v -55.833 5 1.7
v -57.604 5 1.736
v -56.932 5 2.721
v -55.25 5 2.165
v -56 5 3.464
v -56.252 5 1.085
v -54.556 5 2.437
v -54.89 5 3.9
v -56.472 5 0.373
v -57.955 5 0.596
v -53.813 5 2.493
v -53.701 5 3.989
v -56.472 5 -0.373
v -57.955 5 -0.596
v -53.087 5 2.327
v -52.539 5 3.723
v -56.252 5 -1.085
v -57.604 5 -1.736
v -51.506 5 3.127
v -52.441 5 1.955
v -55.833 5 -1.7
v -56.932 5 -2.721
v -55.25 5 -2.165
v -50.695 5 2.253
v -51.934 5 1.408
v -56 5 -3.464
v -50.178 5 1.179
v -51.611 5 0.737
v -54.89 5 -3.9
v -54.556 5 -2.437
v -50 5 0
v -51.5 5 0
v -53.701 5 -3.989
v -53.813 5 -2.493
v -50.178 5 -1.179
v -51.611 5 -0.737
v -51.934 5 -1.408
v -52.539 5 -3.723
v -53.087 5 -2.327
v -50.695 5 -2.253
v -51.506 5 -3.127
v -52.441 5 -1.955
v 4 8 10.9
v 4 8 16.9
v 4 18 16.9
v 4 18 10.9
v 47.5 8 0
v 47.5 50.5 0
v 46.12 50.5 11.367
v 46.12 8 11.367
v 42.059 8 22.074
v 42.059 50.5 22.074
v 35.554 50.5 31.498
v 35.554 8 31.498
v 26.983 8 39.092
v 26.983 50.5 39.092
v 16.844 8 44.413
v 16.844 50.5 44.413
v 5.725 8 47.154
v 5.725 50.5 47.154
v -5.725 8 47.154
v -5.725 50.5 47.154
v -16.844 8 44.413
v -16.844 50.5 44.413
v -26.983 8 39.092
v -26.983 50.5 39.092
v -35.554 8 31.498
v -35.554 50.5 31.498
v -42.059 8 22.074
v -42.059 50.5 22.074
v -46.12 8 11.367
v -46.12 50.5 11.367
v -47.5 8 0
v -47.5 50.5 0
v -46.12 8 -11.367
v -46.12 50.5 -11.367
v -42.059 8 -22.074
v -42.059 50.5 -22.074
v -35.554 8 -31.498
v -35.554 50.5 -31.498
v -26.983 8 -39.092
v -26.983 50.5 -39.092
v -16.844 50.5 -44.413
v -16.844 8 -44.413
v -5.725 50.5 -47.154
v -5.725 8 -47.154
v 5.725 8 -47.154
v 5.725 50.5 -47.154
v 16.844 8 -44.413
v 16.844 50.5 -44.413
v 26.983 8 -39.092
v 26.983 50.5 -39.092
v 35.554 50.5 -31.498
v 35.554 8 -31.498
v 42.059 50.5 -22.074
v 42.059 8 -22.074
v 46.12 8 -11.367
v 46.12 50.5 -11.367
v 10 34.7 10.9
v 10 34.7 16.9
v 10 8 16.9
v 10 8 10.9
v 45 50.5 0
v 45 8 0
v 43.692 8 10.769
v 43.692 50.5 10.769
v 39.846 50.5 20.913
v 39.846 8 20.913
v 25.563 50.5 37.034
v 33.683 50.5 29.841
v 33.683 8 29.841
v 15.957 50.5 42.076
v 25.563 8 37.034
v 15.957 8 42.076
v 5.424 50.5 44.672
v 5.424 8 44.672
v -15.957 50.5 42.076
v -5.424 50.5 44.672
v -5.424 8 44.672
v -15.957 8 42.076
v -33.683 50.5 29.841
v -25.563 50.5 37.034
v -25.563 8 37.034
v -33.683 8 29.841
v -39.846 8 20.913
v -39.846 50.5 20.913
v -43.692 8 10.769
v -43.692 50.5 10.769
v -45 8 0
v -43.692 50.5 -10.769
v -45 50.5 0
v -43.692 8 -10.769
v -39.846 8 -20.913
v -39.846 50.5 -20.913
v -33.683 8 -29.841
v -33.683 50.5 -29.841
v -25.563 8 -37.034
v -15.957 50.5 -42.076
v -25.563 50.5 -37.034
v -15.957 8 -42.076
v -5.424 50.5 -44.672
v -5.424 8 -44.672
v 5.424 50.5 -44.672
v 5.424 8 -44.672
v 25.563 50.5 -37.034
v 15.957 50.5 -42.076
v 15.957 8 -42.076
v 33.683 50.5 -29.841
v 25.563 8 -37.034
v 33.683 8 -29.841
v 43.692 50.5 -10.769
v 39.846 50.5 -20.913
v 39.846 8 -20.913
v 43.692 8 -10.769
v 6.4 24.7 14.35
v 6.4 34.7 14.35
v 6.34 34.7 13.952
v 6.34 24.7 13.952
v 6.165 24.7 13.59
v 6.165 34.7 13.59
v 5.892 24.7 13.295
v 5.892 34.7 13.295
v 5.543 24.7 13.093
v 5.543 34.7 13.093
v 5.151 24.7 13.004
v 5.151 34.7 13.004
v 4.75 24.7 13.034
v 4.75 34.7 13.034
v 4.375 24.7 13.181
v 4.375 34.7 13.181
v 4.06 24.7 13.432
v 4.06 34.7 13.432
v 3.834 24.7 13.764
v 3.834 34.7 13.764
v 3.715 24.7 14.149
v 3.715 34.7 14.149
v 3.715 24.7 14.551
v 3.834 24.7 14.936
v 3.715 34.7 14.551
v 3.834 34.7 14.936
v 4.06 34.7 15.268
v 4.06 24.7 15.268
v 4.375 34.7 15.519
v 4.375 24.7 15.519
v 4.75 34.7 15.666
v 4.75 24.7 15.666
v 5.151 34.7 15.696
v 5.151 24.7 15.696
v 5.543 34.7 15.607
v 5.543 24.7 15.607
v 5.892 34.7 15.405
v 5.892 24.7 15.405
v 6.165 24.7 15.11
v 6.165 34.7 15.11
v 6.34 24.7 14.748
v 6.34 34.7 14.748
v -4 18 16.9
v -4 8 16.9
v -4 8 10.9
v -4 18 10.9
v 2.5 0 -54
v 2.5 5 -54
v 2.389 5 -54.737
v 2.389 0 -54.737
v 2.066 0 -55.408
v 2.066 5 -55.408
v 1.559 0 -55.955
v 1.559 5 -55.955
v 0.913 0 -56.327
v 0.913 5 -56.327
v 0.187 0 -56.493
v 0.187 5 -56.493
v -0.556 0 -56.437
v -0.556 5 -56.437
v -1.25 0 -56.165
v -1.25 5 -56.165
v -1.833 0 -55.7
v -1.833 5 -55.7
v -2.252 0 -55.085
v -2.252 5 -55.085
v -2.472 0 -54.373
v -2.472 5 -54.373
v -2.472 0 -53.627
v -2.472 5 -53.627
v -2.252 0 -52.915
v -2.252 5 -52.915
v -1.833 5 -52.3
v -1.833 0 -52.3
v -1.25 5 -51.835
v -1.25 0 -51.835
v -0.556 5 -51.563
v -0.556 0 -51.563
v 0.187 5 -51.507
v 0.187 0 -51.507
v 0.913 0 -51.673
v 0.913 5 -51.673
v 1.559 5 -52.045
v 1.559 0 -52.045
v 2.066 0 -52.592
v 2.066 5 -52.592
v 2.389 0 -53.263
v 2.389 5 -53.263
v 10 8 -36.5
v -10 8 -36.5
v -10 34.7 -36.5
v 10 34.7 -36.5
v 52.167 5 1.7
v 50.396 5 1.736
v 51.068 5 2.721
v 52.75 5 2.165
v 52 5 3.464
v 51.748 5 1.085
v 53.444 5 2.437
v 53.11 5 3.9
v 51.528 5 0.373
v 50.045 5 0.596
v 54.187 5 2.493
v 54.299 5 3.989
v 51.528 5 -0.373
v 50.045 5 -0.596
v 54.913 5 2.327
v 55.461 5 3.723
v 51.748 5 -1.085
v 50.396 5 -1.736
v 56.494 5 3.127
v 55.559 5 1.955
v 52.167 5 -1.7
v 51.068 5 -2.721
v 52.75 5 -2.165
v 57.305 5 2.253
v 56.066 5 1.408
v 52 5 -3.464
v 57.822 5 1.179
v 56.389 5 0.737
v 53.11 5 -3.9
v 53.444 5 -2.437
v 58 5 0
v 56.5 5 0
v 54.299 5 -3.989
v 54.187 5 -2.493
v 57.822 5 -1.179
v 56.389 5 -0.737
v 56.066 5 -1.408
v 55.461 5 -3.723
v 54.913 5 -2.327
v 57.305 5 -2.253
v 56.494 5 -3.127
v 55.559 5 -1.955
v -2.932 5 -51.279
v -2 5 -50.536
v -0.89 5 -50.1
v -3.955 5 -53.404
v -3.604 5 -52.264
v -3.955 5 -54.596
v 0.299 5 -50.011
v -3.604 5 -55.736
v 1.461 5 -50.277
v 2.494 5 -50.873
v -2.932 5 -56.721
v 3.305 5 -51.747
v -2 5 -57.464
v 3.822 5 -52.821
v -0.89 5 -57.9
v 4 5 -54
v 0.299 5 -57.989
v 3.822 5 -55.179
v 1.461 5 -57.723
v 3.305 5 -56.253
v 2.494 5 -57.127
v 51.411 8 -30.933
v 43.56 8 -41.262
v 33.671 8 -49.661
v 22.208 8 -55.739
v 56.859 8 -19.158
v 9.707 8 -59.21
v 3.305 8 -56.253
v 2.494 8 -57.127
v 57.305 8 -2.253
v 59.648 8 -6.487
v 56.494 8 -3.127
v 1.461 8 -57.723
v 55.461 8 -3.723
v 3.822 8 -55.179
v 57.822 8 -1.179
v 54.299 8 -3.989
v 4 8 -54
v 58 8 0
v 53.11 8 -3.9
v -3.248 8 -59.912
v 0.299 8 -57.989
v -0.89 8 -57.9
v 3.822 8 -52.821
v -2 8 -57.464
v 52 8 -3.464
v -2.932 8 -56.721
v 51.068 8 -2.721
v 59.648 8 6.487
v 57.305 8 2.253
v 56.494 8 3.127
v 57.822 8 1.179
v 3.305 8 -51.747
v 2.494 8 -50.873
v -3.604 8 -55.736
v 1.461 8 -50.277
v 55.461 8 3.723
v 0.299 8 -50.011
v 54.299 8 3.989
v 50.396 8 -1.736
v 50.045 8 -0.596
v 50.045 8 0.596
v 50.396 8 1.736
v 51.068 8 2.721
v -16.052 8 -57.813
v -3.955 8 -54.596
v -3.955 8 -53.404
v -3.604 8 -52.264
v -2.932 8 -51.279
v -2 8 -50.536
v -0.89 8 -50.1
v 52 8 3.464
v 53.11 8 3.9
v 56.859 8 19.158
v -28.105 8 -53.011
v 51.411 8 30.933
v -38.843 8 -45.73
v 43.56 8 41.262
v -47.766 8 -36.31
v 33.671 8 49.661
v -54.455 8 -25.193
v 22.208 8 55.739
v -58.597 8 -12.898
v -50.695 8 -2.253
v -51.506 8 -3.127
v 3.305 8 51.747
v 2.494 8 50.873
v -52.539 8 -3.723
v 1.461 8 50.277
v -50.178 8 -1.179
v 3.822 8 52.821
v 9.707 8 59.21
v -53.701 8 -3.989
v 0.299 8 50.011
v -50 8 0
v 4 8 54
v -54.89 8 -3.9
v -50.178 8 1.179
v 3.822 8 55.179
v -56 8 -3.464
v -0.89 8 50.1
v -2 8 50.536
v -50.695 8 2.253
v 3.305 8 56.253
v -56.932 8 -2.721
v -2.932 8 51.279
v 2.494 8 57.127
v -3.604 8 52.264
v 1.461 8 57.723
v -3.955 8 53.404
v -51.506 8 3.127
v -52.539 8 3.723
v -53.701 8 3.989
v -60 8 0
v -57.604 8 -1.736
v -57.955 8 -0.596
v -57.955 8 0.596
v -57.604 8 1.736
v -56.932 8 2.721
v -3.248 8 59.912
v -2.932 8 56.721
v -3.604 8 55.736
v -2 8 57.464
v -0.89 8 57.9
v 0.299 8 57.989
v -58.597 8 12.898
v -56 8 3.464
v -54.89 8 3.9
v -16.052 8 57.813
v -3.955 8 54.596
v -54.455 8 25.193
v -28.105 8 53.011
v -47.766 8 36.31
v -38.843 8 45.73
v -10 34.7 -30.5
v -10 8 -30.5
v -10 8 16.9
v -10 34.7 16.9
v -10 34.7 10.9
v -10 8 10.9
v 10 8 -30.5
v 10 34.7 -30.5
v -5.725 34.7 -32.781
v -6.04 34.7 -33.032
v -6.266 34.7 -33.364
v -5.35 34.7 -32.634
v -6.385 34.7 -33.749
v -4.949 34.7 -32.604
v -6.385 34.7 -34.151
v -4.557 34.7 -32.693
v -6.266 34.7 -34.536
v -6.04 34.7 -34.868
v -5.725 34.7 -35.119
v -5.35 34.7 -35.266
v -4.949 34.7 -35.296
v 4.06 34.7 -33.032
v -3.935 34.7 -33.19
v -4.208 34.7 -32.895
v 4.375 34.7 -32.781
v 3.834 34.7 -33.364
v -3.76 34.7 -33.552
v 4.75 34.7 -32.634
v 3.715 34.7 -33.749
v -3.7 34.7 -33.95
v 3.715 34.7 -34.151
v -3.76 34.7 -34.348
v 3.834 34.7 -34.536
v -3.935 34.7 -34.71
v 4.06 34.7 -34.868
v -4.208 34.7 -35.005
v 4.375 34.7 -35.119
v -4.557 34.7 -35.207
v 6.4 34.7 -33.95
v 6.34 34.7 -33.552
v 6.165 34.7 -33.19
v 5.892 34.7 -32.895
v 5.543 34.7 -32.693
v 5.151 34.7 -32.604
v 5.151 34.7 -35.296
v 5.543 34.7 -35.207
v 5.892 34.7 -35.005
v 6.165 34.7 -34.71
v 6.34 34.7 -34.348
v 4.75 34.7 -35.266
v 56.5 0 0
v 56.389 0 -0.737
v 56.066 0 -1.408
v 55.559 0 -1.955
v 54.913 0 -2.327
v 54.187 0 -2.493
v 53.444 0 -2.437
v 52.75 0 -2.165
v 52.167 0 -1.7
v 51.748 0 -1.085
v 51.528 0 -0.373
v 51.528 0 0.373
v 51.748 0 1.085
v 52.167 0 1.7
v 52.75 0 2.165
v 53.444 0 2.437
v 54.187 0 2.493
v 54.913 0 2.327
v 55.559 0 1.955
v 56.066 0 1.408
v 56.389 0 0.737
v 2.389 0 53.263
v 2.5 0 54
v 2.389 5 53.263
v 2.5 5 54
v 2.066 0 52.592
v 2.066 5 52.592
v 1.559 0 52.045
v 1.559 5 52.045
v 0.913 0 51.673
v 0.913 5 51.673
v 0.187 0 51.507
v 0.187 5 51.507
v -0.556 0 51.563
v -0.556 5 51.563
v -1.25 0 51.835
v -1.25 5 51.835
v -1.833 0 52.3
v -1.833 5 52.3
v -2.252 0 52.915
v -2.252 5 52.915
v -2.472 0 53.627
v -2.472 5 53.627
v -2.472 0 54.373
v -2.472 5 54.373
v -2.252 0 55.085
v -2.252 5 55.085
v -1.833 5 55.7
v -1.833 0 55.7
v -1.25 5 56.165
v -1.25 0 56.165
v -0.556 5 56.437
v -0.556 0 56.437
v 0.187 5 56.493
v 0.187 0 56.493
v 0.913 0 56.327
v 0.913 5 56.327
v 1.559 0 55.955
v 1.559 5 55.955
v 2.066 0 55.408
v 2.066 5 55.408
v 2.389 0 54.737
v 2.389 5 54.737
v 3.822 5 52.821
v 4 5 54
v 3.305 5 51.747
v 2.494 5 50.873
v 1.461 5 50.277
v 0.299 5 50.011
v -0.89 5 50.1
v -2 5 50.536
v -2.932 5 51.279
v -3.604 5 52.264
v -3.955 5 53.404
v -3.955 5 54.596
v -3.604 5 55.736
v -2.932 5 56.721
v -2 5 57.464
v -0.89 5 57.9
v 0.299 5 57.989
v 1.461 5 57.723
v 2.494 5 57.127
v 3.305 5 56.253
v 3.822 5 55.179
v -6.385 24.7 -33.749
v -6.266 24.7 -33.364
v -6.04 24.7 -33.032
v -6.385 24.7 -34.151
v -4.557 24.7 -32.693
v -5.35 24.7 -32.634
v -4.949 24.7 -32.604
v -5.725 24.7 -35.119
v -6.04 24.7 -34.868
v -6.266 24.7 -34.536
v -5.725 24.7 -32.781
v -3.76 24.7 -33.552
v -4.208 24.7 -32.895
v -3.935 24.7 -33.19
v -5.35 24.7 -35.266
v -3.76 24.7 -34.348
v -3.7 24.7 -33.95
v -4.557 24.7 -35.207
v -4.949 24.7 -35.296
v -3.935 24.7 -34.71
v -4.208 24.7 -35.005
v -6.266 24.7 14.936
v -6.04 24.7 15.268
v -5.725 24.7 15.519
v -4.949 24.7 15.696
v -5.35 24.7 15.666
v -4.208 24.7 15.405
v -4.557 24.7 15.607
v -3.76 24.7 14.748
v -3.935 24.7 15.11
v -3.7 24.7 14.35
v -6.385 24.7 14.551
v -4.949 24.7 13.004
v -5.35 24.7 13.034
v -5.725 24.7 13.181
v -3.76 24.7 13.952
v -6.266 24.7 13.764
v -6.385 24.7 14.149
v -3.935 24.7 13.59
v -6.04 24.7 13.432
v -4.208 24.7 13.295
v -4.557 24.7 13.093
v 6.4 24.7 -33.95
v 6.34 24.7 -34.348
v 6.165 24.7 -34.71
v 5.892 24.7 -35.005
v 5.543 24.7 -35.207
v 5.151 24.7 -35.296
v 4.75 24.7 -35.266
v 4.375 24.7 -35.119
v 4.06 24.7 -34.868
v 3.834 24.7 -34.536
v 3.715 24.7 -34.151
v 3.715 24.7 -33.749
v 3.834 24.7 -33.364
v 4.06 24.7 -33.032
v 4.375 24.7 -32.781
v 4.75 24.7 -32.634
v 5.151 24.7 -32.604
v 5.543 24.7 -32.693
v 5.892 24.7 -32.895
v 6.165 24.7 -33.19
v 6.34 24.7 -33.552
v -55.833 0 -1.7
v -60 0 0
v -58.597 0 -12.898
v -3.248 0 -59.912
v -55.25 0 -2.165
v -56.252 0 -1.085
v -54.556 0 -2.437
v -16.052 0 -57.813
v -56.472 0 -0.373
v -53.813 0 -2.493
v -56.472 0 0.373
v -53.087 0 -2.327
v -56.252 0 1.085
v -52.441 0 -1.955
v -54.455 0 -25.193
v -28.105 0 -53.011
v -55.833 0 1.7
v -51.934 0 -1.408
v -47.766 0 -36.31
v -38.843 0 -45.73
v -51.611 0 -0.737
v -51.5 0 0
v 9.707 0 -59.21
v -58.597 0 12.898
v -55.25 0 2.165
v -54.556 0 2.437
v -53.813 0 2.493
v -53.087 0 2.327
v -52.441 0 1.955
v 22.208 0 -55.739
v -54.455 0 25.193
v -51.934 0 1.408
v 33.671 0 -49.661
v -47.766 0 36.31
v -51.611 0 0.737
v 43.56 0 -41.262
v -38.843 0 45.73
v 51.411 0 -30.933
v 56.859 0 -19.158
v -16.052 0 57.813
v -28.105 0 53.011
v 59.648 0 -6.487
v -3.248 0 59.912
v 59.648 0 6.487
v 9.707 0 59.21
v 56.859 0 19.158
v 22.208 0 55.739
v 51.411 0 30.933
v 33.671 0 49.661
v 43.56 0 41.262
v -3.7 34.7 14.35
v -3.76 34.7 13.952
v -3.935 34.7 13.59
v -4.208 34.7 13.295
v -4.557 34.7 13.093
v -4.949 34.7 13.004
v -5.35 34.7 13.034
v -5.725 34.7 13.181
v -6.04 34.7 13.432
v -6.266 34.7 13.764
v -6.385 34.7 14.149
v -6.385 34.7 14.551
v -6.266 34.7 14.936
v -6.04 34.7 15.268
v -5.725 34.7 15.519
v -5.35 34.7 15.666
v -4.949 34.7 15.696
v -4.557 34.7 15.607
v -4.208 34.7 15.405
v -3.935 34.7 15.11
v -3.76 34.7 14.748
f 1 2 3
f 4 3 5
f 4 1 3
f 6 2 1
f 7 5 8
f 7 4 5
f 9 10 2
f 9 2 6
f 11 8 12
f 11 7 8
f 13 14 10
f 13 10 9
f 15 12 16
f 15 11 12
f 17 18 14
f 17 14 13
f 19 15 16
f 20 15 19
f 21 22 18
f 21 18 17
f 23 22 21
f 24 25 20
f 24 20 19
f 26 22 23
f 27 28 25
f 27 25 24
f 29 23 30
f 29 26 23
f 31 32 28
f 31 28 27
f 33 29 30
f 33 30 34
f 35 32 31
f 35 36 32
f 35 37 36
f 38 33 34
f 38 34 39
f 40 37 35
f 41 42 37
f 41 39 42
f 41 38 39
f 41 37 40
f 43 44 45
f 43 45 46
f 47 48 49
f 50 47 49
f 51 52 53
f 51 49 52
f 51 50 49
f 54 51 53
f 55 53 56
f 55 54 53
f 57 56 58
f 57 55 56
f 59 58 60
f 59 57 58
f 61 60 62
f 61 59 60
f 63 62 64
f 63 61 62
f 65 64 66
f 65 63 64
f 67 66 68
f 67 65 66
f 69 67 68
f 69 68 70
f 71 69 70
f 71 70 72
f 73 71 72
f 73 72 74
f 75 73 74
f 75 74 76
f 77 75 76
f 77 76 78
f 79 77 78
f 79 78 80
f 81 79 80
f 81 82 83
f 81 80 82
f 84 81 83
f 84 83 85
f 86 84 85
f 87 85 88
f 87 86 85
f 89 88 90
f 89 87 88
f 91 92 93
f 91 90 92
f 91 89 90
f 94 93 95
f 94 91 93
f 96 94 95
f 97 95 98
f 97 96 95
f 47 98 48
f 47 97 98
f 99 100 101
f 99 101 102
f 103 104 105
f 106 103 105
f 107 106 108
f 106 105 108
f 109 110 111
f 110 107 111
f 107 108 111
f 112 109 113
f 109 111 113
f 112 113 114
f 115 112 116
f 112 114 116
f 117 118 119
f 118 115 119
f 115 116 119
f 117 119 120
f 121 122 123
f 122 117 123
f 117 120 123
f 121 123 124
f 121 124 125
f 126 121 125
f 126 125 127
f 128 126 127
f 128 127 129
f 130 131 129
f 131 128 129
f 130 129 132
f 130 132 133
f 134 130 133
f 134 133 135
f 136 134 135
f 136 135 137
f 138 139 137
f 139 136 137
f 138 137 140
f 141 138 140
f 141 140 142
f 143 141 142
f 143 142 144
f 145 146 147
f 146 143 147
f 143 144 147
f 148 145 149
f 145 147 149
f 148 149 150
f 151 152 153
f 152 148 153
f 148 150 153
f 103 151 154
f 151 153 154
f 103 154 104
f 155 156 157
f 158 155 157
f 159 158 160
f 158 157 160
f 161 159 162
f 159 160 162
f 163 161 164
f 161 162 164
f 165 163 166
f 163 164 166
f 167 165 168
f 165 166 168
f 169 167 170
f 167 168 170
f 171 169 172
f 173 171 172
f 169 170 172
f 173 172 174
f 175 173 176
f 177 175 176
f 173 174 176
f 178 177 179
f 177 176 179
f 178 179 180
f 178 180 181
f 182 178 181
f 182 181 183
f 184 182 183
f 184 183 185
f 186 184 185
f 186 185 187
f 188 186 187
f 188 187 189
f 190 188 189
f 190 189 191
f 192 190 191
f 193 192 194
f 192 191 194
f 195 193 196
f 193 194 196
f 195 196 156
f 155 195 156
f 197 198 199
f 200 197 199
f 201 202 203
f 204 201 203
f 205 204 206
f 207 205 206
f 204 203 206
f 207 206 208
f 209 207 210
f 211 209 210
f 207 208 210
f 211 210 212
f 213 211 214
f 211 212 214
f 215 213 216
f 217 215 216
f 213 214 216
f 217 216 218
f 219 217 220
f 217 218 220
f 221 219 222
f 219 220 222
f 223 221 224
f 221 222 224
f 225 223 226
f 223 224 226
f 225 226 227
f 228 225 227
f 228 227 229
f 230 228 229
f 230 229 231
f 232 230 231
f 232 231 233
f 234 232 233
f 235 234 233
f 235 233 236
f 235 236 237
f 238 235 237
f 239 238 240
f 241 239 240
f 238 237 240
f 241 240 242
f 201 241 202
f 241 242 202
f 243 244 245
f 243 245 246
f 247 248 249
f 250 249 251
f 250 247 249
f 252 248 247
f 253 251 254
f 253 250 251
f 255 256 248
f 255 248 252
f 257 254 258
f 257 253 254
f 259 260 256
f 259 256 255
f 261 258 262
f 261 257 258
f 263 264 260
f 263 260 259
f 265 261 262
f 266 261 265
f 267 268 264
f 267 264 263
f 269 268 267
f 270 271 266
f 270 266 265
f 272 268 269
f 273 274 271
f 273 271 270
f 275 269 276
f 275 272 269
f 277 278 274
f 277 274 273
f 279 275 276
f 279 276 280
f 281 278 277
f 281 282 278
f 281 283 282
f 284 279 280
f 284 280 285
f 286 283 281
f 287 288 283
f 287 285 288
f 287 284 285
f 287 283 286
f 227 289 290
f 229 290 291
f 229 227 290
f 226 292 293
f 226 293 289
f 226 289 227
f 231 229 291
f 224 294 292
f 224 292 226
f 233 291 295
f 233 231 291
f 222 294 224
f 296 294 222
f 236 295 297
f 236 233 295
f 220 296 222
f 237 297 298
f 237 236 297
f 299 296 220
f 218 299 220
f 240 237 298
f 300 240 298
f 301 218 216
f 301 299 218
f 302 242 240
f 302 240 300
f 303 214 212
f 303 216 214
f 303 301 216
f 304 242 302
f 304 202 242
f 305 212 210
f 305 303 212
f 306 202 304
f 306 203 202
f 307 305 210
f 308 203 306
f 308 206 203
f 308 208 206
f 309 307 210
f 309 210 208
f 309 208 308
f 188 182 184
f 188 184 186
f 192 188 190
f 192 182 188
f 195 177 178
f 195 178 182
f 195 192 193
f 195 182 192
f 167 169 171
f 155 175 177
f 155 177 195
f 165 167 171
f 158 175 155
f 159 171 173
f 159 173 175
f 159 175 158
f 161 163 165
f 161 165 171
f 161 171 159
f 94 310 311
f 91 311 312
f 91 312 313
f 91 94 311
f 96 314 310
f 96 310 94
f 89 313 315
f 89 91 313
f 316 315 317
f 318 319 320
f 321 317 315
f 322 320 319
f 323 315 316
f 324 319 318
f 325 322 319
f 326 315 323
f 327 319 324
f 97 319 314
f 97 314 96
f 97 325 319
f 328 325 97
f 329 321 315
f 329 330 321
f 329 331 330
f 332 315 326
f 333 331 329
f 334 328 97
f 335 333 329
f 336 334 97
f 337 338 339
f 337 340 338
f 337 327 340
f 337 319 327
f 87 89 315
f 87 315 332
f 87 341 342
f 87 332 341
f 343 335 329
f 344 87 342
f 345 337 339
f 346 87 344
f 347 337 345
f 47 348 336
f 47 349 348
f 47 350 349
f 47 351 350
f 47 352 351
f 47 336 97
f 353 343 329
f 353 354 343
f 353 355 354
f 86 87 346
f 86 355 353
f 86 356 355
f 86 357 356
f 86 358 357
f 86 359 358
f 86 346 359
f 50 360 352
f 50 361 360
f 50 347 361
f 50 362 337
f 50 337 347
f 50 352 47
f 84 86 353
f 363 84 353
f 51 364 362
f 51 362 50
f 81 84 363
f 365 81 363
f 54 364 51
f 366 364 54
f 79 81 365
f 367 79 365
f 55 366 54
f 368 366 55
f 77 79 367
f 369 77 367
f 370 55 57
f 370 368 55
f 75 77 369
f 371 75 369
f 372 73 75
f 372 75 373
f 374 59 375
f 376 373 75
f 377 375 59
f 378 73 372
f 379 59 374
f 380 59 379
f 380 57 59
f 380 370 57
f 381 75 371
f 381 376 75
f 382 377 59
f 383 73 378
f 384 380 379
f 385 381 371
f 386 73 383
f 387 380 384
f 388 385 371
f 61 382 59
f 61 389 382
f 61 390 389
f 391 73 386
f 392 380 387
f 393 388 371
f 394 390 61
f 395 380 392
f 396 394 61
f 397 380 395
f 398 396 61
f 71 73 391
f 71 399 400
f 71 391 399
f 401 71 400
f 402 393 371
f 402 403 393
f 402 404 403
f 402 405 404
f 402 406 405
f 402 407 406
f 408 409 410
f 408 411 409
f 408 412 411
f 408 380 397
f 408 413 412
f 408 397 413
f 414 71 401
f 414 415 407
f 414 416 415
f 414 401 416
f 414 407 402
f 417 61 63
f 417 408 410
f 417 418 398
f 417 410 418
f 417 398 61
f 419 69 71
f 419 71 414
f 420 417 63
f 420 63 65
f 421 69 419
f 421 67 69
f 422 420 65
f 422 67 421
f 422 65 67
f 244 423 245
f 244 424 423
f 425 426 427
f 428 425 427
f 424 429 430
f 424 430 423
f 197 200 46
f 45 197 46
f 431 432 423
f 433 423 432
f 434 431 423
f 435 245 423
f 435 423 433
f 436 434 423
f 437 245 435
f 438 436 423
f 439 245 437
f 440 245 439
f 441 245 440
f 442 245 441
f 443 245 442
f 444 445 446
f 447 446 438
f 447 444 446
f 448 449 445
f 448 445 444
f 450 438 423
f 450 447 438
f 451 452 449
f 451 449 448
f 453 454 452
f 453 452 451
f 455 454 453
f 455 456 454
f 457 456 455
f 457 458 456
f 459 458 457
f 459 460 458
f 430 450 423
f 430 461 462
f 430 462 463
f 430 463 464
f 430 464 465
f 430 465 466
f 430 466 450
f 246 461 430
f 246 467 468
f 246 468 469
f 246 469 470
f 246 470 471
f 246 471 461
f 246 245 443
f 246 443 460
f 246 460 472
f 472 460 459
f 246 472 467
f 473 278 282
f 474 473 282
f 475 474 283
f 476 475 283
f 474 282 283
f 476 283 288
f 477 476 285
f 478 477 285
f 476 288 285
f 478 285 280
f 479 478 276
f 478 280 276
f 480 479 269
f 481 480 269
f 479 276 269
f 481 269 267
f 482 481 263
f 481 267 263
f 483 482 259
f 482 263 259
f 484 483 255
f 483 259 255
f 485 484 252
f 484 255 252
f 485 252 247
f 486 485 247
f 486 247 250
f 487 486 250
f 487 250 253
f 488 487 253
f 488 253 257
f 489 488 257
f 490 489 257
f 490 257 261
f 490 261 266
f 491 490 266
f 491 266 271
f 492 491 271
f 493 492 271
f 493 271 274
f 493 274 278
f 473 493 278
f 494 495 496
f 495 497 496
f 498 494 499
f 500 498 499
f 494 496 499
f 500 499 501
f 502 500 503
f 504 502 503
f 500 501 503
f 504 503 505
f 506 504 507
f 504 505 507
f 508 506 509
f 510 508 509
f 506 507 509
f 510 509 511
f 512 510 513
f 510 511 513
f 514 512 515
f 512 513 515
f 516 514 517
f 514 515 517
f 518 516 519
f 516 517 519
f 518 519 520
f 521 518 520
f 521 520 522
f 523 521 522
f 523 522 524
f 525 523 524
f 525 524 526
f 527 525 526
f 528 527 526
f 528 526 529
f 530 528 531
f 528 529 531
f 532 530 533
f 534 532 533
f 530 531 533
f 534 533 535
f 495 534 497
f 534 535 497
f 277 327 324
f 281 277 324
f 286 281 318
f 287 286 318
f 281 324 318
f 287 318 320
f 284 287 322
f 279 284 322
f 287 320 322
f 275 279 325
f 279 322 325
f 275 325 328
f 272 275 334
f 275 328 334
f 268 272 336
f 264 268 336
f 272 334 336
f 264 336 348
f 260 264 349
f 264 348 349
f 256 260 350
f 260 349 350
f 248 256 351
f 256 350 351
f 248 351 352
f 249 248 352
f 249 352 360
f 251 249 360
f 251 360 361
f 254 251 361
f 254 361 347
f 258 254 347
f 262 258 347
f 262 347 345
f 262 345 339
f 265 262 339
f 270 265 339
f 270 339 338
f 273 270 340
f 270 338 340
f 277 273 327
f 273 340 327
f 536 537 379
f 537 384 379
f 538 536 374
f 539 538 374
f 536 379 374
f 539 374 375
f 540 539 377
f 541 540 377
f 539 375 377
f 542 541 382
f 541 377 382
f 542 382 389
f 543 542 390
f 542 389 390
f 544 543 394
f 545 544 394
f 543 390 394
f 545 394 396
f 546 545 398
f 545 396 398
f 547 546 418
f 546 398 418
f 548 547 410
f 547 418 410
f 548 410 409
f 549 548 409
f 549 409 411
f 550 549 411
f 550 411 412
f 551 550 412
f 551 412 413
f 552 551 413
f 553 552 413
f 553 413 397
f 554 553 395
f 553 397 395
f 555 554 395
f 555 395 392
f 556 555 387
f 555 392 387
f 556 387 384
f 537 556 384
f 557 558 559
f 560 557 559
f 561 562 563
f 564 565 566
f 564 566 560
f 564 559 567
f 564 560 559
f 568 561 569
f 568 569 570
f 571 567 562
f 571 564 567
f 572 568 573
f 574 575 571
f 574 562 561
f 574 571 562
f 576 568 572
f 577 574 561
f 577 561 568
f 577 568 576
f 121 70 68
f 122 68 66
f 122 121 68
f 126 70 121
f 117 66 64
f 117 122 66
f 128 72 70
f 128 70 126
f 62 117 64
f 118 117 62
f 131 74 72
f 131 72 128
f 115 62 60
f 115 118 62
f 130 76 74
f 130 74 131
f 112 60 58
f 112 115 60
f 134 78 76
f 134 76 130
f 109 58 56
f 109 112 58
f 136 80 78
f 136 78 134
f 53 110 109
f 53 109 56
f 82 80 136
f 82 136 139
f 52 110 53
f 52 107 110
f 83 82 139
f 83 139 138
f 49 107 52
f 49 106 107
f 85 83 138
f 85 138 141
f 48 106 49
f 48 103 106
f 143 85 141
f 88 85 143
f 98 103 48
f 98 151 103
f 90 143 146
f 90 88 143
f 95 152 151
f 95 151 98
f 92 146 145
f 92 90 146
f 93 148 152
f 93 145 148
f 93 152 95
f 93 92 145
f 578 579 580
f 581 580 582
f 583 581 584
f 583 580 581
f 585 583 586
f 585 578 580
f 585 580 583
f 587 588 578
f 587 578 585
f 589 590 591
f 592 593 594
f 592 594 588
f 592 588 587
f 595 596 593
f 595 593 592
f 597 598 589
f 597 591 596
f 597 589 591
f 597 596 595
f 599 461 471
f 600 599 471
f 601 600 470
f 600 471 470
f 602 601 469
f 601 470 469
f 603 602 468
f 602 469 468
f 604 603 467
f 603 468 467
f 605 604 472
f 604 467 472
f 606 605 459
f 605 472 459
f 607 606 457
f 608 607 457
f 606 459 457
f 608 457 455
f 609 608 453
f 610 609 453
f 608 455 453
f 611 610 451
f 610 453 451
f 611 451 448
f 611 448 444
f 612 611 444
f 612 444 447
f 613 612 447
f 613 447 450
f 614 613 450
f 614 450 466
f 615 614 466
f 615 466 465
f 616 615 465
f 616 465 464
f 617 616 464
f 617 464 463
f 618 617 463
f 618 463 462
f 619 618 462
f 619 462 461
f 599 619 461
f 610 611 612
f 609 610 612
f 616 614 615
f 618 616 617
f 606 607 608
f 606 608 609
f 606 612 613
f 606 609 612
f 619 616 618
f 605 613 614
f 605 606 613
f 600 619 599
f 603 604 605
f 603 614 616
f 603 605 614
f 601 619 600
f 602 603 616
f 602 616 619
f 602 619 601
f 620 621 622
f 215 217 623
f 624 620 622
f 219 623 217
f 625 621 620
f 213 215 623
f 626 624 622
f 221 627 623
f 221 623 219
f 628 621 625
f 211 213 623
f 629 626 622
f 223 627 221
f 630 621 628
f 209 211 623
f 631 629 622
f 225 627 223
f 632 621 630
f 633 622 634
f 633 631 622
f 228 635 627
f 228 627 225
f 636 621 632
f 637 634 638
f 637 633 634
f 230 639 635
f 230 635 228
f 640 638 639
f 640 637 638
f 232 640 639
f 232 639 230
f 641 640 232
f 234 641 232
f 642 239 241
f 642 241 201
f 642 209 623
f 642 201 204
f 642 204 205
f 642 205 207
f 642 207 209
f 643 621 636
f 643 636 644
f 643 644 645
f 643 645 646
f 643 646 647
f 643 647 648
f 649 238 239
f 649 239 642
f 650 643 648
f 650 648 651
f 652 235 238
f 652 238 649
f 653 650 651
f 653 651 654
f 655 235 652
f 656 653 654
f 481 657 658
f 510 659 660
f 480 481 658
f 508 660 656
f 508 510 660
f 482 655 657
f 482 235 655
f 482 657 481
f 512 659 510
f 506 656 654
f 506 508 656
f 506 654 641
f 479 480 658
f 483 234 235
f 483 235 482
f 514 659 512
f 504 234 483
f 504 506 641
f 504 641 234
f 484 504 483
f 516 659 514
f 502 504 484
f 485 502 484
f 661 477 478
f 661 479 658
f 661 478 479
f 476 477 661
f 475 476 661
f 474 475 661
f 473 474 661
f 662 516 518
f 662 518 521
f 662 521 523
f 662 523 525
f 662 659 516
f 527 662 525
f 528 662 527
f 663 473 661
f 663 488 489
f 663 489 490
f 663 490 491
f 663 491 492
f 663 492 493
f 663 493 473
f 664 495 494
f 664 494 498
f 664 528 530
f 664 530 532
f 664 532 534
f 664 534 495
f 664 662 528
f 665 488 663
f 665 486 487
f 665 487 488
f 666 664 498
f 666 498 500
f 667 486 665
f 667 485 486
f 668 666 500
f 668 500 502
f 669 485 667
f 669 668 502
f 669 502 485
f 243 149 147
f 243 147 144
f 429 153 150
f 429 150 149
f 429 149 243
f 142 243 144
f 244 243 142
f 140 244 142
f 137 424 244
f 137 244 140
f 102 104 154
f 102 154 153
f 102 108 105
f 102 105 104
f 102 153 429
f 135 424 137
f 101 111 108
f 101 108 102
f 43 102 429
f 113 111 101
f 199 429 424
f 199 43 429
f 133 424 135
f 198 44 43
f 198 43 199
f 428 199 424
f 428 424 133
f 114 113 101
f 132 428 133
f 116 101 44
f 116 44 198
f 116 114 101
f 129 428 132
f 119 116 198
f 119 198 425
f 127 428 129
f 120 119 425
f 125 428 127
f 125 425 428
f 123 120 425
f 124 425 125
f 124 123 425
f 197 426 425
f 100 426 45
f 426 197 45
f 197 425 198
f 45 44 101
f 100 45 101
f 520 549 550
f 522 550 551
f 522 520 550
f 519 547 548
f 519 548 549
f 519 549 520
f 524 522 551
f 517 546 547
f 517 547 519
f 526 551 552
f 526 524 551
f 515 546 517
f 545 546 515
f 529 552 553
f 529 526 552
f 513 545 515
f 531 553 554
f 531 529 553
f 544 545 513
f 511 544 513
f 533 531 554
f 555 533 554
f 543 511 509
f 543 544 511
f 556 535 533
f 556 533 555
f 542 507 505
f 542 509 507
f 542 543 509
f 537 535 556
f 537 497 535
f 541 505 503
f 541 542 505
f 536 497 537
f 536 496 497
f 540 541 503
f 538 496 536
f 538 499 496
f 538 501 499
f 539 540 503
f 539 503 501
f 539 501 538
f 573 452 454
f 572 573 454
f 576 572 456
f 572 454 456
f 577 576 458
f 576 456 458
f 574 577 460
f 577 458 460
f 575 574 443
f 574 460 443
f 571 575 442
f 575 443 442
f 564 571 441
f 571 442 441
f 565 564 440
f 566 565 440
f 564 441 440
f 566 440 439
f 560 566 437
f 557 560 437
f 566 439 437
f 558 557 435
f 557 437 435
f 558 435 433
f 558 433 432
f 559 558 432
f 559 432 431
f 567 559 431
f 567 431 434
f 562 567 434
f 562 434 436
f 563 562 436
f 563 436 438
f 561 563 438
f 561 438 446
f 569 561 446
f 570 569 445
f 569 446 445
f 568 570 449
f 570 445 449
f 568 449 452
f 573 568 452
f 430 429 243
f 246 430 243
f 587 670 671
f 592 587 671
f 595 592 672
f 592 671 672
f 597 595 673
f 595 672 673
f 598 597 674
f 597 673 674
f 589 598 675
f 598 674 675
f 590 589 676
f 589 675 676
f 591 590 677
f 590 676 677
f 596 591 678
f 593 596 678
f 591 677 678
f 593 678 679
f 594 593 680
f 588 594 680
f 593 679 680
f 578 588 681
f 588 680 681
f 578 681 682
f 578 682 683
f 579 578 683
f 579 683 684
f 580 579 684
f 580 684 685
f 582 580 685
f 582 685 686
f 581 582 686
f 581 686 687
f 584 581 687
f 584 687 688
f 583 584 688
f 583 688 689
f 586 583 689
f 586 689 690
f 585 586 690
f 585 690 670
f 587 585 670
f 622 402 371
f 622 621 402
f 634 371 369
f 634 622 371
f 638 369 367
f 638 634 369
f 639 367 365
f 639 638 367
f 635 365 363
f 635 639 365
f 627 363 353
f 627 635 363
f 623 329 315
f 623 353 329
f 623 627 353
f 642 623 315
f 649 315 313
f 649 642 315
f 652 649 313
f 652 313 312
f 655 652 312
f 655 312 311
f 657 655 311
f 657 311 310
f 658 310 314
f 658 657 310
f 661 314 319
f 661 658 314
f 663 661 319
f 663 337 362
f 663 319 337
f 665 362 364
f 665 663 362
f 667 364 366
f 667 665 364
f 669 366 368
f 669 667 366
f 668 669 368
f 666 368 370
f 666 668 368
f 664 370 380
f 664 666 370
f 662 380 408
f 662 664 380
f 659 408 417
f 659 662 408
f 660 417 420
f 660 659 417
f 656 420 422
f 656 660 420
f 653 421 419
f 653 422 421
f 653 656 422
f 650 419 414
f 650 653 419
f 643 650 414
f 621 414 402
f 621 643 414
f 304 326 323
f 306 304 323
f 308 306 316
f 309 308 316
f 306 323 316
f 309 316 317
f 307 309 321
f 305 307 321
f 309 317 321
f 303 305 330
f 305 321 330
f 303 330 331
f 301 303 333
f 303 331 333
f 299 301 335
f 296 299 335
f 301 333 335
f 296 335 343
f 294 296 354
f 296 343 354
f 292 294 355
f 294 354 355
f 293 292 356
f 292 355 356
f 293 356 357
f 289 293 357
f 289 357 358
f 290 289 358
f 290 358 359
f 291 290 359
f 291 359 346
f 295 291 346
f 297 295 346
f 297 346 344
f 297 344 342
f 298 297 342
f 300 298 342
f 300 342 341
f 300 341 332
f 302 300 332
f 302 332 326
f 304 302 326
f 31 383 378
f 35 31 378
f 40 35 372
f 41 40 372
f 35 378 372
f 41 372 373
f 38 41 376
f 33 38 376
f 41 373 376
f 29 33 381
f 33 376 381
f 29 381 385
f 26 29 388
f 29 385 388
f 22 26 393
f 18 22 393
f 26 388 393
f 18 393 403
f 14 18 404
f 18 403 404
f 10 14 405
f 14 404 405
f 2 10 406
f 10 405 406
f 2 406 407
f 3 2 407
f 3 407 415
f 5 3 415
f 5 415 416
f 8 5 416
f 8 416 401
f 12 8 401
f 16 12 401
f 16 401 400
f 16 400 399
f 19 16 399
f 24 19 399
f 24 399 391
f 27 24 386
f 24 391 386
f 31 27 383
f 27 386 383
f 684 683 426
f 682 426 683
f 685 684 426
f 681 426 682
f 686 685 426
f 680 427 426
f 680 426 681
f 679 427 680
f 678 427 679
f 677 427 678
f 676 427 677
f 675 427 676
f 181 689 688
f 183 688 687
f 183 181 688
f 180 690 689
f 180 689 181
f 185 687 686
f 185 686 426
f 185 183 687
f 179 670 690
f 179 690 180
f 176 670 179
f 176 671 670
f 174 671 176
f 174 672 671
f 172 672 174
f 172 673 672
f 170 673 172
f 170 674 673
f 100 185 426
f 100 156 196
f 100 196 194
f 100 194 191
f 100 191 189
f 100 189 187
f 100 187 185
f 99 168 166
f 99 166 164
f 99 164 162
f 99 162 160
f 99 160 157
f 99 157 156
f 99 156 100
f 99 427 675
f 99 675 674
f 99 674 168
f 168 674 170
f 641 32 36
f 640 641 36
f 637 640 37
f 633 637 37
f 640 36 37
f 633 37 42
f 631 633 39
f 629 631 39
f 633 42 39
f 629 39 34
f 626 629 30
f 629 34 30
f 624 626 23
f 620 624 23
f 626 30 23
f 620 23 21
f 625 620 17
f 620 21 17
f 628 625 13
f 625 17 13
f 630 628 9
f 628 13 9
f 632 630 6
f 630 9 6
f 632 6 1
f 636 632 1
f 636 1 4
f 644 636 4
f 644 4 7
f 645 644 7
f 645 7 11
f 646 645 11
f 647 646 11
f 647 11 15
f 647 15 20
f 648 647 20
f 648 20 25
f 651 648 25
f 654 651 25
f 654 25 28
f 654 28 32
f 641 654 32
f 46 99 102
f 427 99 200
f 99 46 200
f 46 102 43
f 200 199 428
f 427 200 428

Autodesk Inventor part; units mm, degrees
ref_plane "YZ Plane" through (0, 0, 0) normal (1, 0, 0) x (0, 1, 0)
ref_plane "XZ Plane" through (0, 0, 0) normal (0, 1, 0) x (-1, 0, 0)
ref_plane "XY Plane" through (0, 0, 0) normal (0, 0, 1) x (1, 0, 0)
sketch "Sketch1" plane through (0, 0, 0) normal (0, 1, 0) x (-1, 0, 0)
  circle A0 centre (0, 0) radius 60
  dimension "d0" = 120
extrude "Extrusion1" add sketch "Sketch1" along normal blind 8
sketch "Sketch2" plane through (0, 8, 0) normal (0, 1, 0) x (1, 0, 0)
  circle A0 centre (-54, 0) radius 4
  circle A1 centre (-54, 0) radius 2.5
  circle A2 centre (0, -54) radius 4
  circle A3 centre (0, -54) radius 2.5
  circle A4 centre (54, 0) radius 4
  circle A5 centre (54, 0) radius 2.5
  circle A6 centre (0, 54) radius 4
  circle A7 centre (0, 54) radius 2.5
  point P0 (0, 0)
  dimension "d3" = 8
  dimension "d4" = 5
  dimension "d5" = 8
  dimension "d6" = 5
  dimension "d7" = 8
  dimension "d8" = 5
  dimension "d9" = 8
  dimension "d10" = 5
extrude "Extrusion2" cut sketch "Sketch2" against normal blind 8 contours A1 | A3 | A5 | A7
sketch "Sketch3" plane through (0, 8, 0) normal (0, 1, 0) x (1, 0, 0)
  circle A0 centre (-54, 0) radius 2.5 projected
  circle A1 centre (-54, 0) radius 4
  circle A2 centre (-54, 0) radius 2.5
  circle A3 centre (0, 54) radius 2.5 projected
  circle A4 centre (0, 54) radius 4
  circle A5 centre (0, 54) radius 2.5
  circle A6 centre (54, 0) radius 2.5 projected
  circle A7 centre (54, 0) radius 4
  circle A8 centre (54, 0) radius 2.5
  circle A9 centre (0, -54) radius 4
  circle A10 centre (0, -54) radius 2.5
  point P0 (0, 0)
  dimension "d13" = 8
  dimension "d14" = 8
  dimension "d15" = 5
  dimension "d16" = 8
  dimension "d17" = 5
  dimension "d18" = 8
extrude "Extrusion3" cut sketch "Sketch3" against normal blind 3
sketch "Sketch4" plane through (0, 8, 0) normal (0, 1, 0) x (1, 0, 0)
  circle A0 centre (0, 0) radius 47.5
  circle A1 centre (0, 0) radius 45
  line L0 (0, 0) -> (-10, 0)
  line L1 (-10, 0) -> (-10, -9)
  line L2 (-10, -9) -> (0, -9)
  line L3 (0, -9) -> (0, 0)
  line L4 (0, -9) -> (10, -9)
  line L5 (10, -9) -> (10, 0)
  line L6 (10, 0) -> (0, 0)
  line L7 (0, 0) -> (0, -9)
  line L8 (-10, -9) -> (10, -9)
  line L9 (10, -9) -> (10, -16)
  line L10 (10, -16) -> (-10, -16)
  line L11 (-10, -16) -> (-10, -9)
  dimension "d21" = 95
  dimension "d22" = 90
  dimension "d23" = 10
  dimension "d24" = 9
  dimension "d25" = 10
  dimension "d26" = 7
extrude "Extrusion4" add sketch "Sketch4" along normal blind 10 contours A0
sketch "Sketch5" plane through (0, 8, 0) normal (0, 1, 0) x (1, 0, 0)
  line L0 (0, 0) -> (-10, 0)
  line L1 (-10, 0) -> (-10, -9)
  line L2 (-10, -9) -> (0, -9)
  line L3 (0, -9) -> (0, 0)
  line L4 (-10, -9) -> (10, -9)
  line L5 (10, -9) -> (10, -16)
  line L6 (10, -16) -> (-10, -16)
  line L7 (-10, -16) -> (-10, -9)
  line L8 (-10, -9) -> (10, -9)
  line L9 (10, -9) -> (10, 31)
  line L10 (10, 31) -> (-10, 31)
  line L11 (-10, 31) -> (-10, -9)
  line L12 (-10, 31) -> (-2, 31)
  line L13 (-2, 31) -> (-2, 38.36)
  line L14 (-2, 38.36) -> (-10, 38.36)
  line L15 (-10, 38.36) -> (-10, 31)
  line L16 (-10, 31) -> (10, 31)
  line L17 (10, 31) -> (10, 39)
  line L18 (10, 39) -> (-10, 39)
  line L19 (-10, 39) -> (-10, 31)
  line L20 (-10, -9) -> (10, -9)
  line L21 (10, -9) -> (10, -17)
  line L22 (10, -17) -> (-10, -17)
  line L23 (-10, -17) -> (-10, -9)
  dimension "d29" = 10
  dimension "d30" = 9
  dimension "d31" = 20
  dimension "d32" = 7
  dimension "d33" = 40
  dimension "d34" = 8
  dimension "d35" = 8
  dimension "d36" = 8
extrude "Extrusion5" add sketch "Sketch5" along normal blind 28 contours L4 L5 L6 L7 L2 | L15 L14 L13 L10 | L6 L21 L22 L23 | L13 L14 L19 L18 L17 L10
sketch "Sketch6" plane through (0, 36, 0) normal (0, 1, 0) x (1, 0, 0)
  line L0 (10, -17) -> (-10, -17) projected
  line L1 (-10, -9) -> (10, -9) projected
  line L2 (0, -17) -> (-4, -17)
  line L3 (-4, -17) -> (-4, -9)
  line L4 (-4, -9) -> (0, -9)
  line L5 (0, -9) -> (0, -17)
  line L6 (0, -17) -> (4, -17)
  line L7 (4, -17) -> (4, -9)
  line L8 (4, -9) -> (0, -9)
  line L9 (0, -9) -> (0, -17)
  point P0 (0, 0)
  dimension "d39" = 4
  dimension "d40" = 4
extrude "Extrusion6" cut sketch "Sketch6" against normal blind 28
sketch "Sketch7" plane through (0, 36, 0) normal (0, 1, 0) x (1, 0, 0)
  line L0 (-10, -17) -> (-4, -17) projected
  line L1 (4, -9) -> (10, -9) projected
  line L2 (-4, -17) -> (4, -17)
  line L3 (4, -17) -> (4, -9)
  line L4 (4, -9) -> (-4, -9)
  line L5 (-4, -9) -> (-4, -17)
  point P0 (0, 0)
extrude "Extrusion7" add sketch "Sketch7" against normal blind 22
sketch "Sketch8" plane through (0, 36, 0) normal (0, 1, 0) x (1, 0, 0)
  line L0 (-4, -17) -> (-10, -17) projected
  line L1 (10, -17) -> (10, -9) projected
  line L2 (-10, -17) -> (10, -17)
  line L3 (10, -17) -> (10, -15)
  line L4 (10, -15) -> (-10, -15)
  line L5 (-10, -15) -> (-10, -17)
  line L6 (-4, -9) -> (4, -9) projected
  line L7 (0, -9) -> (-5, -9)
  line L8 (-5, -9) -> (-5, -17)
  line L9 (-5, -17) -> (0, -17)
  line L10 (0, -17) -> (0, -9)
  line L11 (-10, -17) -> (10, -17) projected
  line L12 (0, -9) -> (5, -9)
  line L13 (5, -9) -> (5, -17)
  line L14 (5, -17) -> (0, -17)
  line L15 (0, -17) -> (0, -9)
  circle A0 centre (-5, -15) radius 2
  circle A1 centre (5, -15) radius 2
  line L16 (-10, 31) -> (-10, 39) projected
  line L17 (10, 39) -> (10, 31) projected
  line L18 (-10, 39) -> (10, 39)
  line L19 (10, 39) -> (10, 37)
  line L20 (10, 37) -> (-10, 37)
  line L21 (-10, 37) -> (-10, 39)
  line L22 (10, 31) -> (-10, 31) projected
  line L23 (-10, 39) -> (10, 39) projected
  line L24 (0, 31) -> (-5, 31)
  line L25 (-5, 31) -> (-5, 39)
  line L26 (-5, 39) -> (0, 39)
  line L27 (0, 39) -> (0, 31)
  line L28 (0, 31) -> (5, 31)
  line L29 (5, 31) -> (5, 39)
  line L30 (5, 39) -> (0, 39)
  line L31 (0, 39) -> (0, 31)
  circle A2 centre (-5, 37) radius 2
  circle A3 centre (5, 37) radius 2
  point P0 (0, 0)
  dimension "d45" = 2
  dimension "d46" = 5
  dimension "d47" = 5
  dimension "d48" = 4
  dimension "d49" = 4
  dimension "d50" = 2
  dimension "d51" = 4
  dimension "d52" = 4
extrude "Extrusion8" cut sketch "Sketch8" against normal blind 10 contours A0 L4 L8 | L8 L4 A0 | L8 A0 L4 | L4 A0 L8 | A1 L4 L13 | L13 L4 A1 | L13 A1 L4 | L4 A1 L13 | A2 L25 L20 | L20 L25 A2 | L25 L20 A2 | A2 L20 L25 | A3 L20 L29 | L29 L20 A3 | A3 L29 L20 | A3 L20 L29
sketch "Sketch9" plane through (0, 36, 0) normal (0, 1, 0) x (1, 0, 0)
  line L0 (-10, -17) -> (-5, -17) projected
  line L1 (10, -9) -> (-10, -9) projected
  line L2 (-10, -17) -> (10, -17)
  line L3 (10, -17) -> (10, -9)
  line L4 (10, -9) -> (-10, -9)
  line L5 (-10, -9) -> (-10, -17)
  line L6 (10, 31) -> (10, 39) projected
  line L7 (-10, 31) -> (10, 31)
  line L8 (10, 31) -> (10, 39)
  line L9 (10, 39) -> (-10, 39)
  line L10 (-10, 39) -> (-10, 31)
  point P0 (0, 0)
extrude "Extrusion9" cut sketch "Sketch9" against normal blind 28
sketch "Sketch10" plane through (0, 8, 0) normal (0, 1, 0) x (1, 0, 0)
  line L0 (0, 0) -> (-10, 0)
  line L1 (-10, 0) -> (-10, 36.5)
  line L2 (-10, 36.5) -> (0, 36.5)
  line L3 (0, 36.5) -> (0, 0)
  line L4 (-10, 0) -> (0, 0)
  line L5 (0, 0) -> (0, -16.9)
  line L6 (0, -16.9) -> (-10, -16.9)
  line L7 (-10, -16.9) -> (-10, 0)
  line L8 (0, -16.9) -> (10, -16.9)
  line L9 (10, -16.9) -> (10, 36.5)
  line L10 (10, 36.5) -> (0, 36.5)
  line L11 (0, 36.5) -> (0, -16.9)
  line L12 (-10, -16.9) -> (10, -16.9)
  line L13 (10, -16.9) -> (10, -10.9)
  line L14 (10, -10.9) -> (-10, -10.9)
  line L15 (-10, -10.9) -> (-10, -16.9)
  line L16 (-10, 36.5) -> (10, 36.5)
  line L17 (10, 36.5) -> (10, 30.5)
  line L18 (10, 30.5) -> (-10, 30.5)
  line L19 (-10, 30.5) -> (-10, 36.5)
  line L20 (-10, -16.9) -> (-4, -16.9)
  line L21 (-4, -16.9) -> (-4, -10.9)
  line L22 (-4, -10.9) -> (-10, -10.9)
  line L23 (-10, -10.9) -> (-10, -16.9)
  line L24 (10, -16.9) -> (4, -16.9)
  line L25 (4, -16.9) -> (4, -10.9)
  line L26 (4, -10.9) -> (10, -10.9)
  line L27 (10, -10.9) -> (10, -16.9)
  dimension "d57" = 10
  dimension "d58" = 36.5
  dimension "d59" = 16.9
  dimension "d60" = 10
  dimension "d61" = 6
  dimension "d62" = 6
  dimension "d63" = 6
  dimension "d64" = 6
extrude "Extrusion10" add sketch "Sketch10" along normal blind 10 contours L18 L1 L2 L3 | L3 L10 L9 L18 | L14 L21 L6 L7 | L14 L9 L8 L25
sketch "Sketch11" plane through (0, 18, 0) normal (0, 1, 0) x (1, 0, 0)
  line L0 (-10, 30.5) -> (10, 30.5) projected
  line L1 (10, 36.5) -> (-10, 36.5) projected
  line L2 (-10, 30.5) -> (10, 30.5)
  line L3 (10, 30.5) -> (10, 36.5)
  line L4 (10, 36.5) -> (-10, 36.5)
  line L5 (-10, 36.5) -> (-10, 30.5)
  line L6 (-10, -16.9) -> (-4, -16.9) projected
  line L7 (10, -10.9) -> (4, -10.9) projected
  line L8 (-10, -16.9) -> (10, -16.9)
  line L9 (10, -16.9) -> (10, -10.9)
  line L10 (10, -10.9) -> (-10, -10.9)
  line L11 (-10, -10.9) -> (-10, -16.9)
  point P0 (0, 0)
extrude "Extrusion11" add sketch "Sketch11" along normal blind 16.7
sketch "Sketch12" plane through (0, 34.7, 0) normal (0, 1, 0) x (1, 0, 0)
  line L0 (10, -16.9) -> (10, -10.9) projected
  line L1 (-10, -16.9) -> (10, -16.9)
  line L2 (10, -16.9) -> (10, -14.35)
  line L3 (10, -14.35) -> (-10, -14.35)
  line L4 (-10, -14.35) -> (-10, -16.9)
  line L5 (10, 30.5) -> (10, 36.5) projected
  line L6 (-10, 36.5) -> (10, 36.5)
  line L7 (10, 36.5) -> (10, 33.95)
  line L8 (10, 33.95) -> (-10, 33.95)
  line L9 (-10, 33.95) -> (-10, 36.5)
  line L10 (0, -16.9) -> (5.05, -16.9)
  line L11 (5.05, -16.9) -> (5.05, -14.35)
  line L12 (5.05, -14.35) -> (0, -14.35)
  line L13 (0, -14.35) -> (0, -16.9)
  line L14 (0, -16.9) -> (-5.05, -16.9)
  line L15 (-5.05, -16.9) -> (-5.05, -14.35)
  line L16 (-5.05, -14.35) -> (0, -14.35)
  line L17 (0, -14.35) -> (0, -16.9)
  line L18 (10, 36.5) -> (-10, 36.5) projected
  line L19 (0, 36.5) -> (-5.05, 36.5)
  line L20 (-5.05, 36.5) -> (-5.05, 33.95)
  line L21 (-5.05, 33.95) -> (0, 33.95)
  line L22 (0, 33.95) -> (0, 36.5)
  line L23 (0, 36.5) -> (5.05, 36.5)
  line L24 (5.05, 36.5) -> (5.05, 33.95)
  line L25 (5.05, 33.95) -> (0, 33.95)
  line L26 (0, 33.95) -> (0, 36.5)
  circle A0 centre (-5.05, -14.35) radius 1.35
  circle A1 centre (5.05, -14.35) radius 1.35
  circle A2 centre (-5.05, 33.95) radius 1.35
  circle A3 centre (5.05, 33.95) radius 1.35
  point P0 (0, 0)
  dimension "d69" = 2.55
  dimension "d70" = 2.55
  dimension "d71" = 5.05
  dimension "d72" = 5.05
  dimension "d73" = 5.05
  dimension "d74" = 5.05
  dimension "d75" = 2.7
  dimension "d76" = 2.7
  dimension "d77" = 2.7
  dimension "d78" = 2.7
extrude "Extrusion12" cut sketch "Sketch12" against normal blind 10 contours A1 L11 L3 | L3 A1 | A1 L3 L11 | A0 L3 L15 | L15 L3 A0 | L3 A0 | A3 L8 | L8 L24 A3 | L8 A3 L24 | A2 L8 | L8 L20 A2 | L20 L8 A2
thread "Thread1" size "M3x0.5" class "6H" standard "ANSI Metric M Profile" full length
thread "Thread2" size "M3x0.5" class "6H" standard "ANSI Metric M Profile" full length
thread "Thread3" size "M3x0.5" class "6H" standard "ANSI Metric M Profile" full length
thread "Thread4" size "M3x0.5" class "6H" standard "ANSI Metric M Profile" full length
sketch "Sketch13" plane through (0, 18, 0) normal (0, 1, 0) x (1, 0, 0)
  circle A0 centre (0, 0) radius 45
  circle A1 centre (0, 0) radius 47.5
extrude "Extrusion13" cut sketch "Sketch13" against normal blind 47.3
sketch "Sketch14" plane through (0, 8, 0) normal (0, 1, 0) x (1, 0, 0)
  circle A0 centre (0, 0) radius 45
  circle A1 centre (0, 0) radius 47.5
extrude "Extrusion14" add sketch "Sketch14" along normal blind 42.5
sketch "Sketch16" plane through (0, 50.5, 0) normal (0, 1, 0) x (1, 0, 0)
  circle A0 centre (0, 0) radius 45
  circle A1 centre (0, 0) radius 47.5
extrude "Extrusion15" cut sketch "Sketch16" against normal blind 42.5
sketch "Sketch17" plane through (0, 0, 0) normal (0, -1, 0) x (1, 0, 0)
  circle A0 centre (0, 0) radius 47.5
  circle A1 centre (0, 0) radius 45
extrude "Extrusion16" add sketch "Sketch17" against normal blind 8
sketch "Sketch18" plane through (0, 8, 0) normal (0, 1, 0) x (1, 0, 0)
  circle A0 centre (0, 0) radius 47.5
  circle A1 centre (0, 0) radius 45
  dimension "d97" = 95
  dimension "d98" = 90
extrude "Extrusion17" add sketch "Sketch18" along normal blind 42.5
properties part number "NBase Part"
